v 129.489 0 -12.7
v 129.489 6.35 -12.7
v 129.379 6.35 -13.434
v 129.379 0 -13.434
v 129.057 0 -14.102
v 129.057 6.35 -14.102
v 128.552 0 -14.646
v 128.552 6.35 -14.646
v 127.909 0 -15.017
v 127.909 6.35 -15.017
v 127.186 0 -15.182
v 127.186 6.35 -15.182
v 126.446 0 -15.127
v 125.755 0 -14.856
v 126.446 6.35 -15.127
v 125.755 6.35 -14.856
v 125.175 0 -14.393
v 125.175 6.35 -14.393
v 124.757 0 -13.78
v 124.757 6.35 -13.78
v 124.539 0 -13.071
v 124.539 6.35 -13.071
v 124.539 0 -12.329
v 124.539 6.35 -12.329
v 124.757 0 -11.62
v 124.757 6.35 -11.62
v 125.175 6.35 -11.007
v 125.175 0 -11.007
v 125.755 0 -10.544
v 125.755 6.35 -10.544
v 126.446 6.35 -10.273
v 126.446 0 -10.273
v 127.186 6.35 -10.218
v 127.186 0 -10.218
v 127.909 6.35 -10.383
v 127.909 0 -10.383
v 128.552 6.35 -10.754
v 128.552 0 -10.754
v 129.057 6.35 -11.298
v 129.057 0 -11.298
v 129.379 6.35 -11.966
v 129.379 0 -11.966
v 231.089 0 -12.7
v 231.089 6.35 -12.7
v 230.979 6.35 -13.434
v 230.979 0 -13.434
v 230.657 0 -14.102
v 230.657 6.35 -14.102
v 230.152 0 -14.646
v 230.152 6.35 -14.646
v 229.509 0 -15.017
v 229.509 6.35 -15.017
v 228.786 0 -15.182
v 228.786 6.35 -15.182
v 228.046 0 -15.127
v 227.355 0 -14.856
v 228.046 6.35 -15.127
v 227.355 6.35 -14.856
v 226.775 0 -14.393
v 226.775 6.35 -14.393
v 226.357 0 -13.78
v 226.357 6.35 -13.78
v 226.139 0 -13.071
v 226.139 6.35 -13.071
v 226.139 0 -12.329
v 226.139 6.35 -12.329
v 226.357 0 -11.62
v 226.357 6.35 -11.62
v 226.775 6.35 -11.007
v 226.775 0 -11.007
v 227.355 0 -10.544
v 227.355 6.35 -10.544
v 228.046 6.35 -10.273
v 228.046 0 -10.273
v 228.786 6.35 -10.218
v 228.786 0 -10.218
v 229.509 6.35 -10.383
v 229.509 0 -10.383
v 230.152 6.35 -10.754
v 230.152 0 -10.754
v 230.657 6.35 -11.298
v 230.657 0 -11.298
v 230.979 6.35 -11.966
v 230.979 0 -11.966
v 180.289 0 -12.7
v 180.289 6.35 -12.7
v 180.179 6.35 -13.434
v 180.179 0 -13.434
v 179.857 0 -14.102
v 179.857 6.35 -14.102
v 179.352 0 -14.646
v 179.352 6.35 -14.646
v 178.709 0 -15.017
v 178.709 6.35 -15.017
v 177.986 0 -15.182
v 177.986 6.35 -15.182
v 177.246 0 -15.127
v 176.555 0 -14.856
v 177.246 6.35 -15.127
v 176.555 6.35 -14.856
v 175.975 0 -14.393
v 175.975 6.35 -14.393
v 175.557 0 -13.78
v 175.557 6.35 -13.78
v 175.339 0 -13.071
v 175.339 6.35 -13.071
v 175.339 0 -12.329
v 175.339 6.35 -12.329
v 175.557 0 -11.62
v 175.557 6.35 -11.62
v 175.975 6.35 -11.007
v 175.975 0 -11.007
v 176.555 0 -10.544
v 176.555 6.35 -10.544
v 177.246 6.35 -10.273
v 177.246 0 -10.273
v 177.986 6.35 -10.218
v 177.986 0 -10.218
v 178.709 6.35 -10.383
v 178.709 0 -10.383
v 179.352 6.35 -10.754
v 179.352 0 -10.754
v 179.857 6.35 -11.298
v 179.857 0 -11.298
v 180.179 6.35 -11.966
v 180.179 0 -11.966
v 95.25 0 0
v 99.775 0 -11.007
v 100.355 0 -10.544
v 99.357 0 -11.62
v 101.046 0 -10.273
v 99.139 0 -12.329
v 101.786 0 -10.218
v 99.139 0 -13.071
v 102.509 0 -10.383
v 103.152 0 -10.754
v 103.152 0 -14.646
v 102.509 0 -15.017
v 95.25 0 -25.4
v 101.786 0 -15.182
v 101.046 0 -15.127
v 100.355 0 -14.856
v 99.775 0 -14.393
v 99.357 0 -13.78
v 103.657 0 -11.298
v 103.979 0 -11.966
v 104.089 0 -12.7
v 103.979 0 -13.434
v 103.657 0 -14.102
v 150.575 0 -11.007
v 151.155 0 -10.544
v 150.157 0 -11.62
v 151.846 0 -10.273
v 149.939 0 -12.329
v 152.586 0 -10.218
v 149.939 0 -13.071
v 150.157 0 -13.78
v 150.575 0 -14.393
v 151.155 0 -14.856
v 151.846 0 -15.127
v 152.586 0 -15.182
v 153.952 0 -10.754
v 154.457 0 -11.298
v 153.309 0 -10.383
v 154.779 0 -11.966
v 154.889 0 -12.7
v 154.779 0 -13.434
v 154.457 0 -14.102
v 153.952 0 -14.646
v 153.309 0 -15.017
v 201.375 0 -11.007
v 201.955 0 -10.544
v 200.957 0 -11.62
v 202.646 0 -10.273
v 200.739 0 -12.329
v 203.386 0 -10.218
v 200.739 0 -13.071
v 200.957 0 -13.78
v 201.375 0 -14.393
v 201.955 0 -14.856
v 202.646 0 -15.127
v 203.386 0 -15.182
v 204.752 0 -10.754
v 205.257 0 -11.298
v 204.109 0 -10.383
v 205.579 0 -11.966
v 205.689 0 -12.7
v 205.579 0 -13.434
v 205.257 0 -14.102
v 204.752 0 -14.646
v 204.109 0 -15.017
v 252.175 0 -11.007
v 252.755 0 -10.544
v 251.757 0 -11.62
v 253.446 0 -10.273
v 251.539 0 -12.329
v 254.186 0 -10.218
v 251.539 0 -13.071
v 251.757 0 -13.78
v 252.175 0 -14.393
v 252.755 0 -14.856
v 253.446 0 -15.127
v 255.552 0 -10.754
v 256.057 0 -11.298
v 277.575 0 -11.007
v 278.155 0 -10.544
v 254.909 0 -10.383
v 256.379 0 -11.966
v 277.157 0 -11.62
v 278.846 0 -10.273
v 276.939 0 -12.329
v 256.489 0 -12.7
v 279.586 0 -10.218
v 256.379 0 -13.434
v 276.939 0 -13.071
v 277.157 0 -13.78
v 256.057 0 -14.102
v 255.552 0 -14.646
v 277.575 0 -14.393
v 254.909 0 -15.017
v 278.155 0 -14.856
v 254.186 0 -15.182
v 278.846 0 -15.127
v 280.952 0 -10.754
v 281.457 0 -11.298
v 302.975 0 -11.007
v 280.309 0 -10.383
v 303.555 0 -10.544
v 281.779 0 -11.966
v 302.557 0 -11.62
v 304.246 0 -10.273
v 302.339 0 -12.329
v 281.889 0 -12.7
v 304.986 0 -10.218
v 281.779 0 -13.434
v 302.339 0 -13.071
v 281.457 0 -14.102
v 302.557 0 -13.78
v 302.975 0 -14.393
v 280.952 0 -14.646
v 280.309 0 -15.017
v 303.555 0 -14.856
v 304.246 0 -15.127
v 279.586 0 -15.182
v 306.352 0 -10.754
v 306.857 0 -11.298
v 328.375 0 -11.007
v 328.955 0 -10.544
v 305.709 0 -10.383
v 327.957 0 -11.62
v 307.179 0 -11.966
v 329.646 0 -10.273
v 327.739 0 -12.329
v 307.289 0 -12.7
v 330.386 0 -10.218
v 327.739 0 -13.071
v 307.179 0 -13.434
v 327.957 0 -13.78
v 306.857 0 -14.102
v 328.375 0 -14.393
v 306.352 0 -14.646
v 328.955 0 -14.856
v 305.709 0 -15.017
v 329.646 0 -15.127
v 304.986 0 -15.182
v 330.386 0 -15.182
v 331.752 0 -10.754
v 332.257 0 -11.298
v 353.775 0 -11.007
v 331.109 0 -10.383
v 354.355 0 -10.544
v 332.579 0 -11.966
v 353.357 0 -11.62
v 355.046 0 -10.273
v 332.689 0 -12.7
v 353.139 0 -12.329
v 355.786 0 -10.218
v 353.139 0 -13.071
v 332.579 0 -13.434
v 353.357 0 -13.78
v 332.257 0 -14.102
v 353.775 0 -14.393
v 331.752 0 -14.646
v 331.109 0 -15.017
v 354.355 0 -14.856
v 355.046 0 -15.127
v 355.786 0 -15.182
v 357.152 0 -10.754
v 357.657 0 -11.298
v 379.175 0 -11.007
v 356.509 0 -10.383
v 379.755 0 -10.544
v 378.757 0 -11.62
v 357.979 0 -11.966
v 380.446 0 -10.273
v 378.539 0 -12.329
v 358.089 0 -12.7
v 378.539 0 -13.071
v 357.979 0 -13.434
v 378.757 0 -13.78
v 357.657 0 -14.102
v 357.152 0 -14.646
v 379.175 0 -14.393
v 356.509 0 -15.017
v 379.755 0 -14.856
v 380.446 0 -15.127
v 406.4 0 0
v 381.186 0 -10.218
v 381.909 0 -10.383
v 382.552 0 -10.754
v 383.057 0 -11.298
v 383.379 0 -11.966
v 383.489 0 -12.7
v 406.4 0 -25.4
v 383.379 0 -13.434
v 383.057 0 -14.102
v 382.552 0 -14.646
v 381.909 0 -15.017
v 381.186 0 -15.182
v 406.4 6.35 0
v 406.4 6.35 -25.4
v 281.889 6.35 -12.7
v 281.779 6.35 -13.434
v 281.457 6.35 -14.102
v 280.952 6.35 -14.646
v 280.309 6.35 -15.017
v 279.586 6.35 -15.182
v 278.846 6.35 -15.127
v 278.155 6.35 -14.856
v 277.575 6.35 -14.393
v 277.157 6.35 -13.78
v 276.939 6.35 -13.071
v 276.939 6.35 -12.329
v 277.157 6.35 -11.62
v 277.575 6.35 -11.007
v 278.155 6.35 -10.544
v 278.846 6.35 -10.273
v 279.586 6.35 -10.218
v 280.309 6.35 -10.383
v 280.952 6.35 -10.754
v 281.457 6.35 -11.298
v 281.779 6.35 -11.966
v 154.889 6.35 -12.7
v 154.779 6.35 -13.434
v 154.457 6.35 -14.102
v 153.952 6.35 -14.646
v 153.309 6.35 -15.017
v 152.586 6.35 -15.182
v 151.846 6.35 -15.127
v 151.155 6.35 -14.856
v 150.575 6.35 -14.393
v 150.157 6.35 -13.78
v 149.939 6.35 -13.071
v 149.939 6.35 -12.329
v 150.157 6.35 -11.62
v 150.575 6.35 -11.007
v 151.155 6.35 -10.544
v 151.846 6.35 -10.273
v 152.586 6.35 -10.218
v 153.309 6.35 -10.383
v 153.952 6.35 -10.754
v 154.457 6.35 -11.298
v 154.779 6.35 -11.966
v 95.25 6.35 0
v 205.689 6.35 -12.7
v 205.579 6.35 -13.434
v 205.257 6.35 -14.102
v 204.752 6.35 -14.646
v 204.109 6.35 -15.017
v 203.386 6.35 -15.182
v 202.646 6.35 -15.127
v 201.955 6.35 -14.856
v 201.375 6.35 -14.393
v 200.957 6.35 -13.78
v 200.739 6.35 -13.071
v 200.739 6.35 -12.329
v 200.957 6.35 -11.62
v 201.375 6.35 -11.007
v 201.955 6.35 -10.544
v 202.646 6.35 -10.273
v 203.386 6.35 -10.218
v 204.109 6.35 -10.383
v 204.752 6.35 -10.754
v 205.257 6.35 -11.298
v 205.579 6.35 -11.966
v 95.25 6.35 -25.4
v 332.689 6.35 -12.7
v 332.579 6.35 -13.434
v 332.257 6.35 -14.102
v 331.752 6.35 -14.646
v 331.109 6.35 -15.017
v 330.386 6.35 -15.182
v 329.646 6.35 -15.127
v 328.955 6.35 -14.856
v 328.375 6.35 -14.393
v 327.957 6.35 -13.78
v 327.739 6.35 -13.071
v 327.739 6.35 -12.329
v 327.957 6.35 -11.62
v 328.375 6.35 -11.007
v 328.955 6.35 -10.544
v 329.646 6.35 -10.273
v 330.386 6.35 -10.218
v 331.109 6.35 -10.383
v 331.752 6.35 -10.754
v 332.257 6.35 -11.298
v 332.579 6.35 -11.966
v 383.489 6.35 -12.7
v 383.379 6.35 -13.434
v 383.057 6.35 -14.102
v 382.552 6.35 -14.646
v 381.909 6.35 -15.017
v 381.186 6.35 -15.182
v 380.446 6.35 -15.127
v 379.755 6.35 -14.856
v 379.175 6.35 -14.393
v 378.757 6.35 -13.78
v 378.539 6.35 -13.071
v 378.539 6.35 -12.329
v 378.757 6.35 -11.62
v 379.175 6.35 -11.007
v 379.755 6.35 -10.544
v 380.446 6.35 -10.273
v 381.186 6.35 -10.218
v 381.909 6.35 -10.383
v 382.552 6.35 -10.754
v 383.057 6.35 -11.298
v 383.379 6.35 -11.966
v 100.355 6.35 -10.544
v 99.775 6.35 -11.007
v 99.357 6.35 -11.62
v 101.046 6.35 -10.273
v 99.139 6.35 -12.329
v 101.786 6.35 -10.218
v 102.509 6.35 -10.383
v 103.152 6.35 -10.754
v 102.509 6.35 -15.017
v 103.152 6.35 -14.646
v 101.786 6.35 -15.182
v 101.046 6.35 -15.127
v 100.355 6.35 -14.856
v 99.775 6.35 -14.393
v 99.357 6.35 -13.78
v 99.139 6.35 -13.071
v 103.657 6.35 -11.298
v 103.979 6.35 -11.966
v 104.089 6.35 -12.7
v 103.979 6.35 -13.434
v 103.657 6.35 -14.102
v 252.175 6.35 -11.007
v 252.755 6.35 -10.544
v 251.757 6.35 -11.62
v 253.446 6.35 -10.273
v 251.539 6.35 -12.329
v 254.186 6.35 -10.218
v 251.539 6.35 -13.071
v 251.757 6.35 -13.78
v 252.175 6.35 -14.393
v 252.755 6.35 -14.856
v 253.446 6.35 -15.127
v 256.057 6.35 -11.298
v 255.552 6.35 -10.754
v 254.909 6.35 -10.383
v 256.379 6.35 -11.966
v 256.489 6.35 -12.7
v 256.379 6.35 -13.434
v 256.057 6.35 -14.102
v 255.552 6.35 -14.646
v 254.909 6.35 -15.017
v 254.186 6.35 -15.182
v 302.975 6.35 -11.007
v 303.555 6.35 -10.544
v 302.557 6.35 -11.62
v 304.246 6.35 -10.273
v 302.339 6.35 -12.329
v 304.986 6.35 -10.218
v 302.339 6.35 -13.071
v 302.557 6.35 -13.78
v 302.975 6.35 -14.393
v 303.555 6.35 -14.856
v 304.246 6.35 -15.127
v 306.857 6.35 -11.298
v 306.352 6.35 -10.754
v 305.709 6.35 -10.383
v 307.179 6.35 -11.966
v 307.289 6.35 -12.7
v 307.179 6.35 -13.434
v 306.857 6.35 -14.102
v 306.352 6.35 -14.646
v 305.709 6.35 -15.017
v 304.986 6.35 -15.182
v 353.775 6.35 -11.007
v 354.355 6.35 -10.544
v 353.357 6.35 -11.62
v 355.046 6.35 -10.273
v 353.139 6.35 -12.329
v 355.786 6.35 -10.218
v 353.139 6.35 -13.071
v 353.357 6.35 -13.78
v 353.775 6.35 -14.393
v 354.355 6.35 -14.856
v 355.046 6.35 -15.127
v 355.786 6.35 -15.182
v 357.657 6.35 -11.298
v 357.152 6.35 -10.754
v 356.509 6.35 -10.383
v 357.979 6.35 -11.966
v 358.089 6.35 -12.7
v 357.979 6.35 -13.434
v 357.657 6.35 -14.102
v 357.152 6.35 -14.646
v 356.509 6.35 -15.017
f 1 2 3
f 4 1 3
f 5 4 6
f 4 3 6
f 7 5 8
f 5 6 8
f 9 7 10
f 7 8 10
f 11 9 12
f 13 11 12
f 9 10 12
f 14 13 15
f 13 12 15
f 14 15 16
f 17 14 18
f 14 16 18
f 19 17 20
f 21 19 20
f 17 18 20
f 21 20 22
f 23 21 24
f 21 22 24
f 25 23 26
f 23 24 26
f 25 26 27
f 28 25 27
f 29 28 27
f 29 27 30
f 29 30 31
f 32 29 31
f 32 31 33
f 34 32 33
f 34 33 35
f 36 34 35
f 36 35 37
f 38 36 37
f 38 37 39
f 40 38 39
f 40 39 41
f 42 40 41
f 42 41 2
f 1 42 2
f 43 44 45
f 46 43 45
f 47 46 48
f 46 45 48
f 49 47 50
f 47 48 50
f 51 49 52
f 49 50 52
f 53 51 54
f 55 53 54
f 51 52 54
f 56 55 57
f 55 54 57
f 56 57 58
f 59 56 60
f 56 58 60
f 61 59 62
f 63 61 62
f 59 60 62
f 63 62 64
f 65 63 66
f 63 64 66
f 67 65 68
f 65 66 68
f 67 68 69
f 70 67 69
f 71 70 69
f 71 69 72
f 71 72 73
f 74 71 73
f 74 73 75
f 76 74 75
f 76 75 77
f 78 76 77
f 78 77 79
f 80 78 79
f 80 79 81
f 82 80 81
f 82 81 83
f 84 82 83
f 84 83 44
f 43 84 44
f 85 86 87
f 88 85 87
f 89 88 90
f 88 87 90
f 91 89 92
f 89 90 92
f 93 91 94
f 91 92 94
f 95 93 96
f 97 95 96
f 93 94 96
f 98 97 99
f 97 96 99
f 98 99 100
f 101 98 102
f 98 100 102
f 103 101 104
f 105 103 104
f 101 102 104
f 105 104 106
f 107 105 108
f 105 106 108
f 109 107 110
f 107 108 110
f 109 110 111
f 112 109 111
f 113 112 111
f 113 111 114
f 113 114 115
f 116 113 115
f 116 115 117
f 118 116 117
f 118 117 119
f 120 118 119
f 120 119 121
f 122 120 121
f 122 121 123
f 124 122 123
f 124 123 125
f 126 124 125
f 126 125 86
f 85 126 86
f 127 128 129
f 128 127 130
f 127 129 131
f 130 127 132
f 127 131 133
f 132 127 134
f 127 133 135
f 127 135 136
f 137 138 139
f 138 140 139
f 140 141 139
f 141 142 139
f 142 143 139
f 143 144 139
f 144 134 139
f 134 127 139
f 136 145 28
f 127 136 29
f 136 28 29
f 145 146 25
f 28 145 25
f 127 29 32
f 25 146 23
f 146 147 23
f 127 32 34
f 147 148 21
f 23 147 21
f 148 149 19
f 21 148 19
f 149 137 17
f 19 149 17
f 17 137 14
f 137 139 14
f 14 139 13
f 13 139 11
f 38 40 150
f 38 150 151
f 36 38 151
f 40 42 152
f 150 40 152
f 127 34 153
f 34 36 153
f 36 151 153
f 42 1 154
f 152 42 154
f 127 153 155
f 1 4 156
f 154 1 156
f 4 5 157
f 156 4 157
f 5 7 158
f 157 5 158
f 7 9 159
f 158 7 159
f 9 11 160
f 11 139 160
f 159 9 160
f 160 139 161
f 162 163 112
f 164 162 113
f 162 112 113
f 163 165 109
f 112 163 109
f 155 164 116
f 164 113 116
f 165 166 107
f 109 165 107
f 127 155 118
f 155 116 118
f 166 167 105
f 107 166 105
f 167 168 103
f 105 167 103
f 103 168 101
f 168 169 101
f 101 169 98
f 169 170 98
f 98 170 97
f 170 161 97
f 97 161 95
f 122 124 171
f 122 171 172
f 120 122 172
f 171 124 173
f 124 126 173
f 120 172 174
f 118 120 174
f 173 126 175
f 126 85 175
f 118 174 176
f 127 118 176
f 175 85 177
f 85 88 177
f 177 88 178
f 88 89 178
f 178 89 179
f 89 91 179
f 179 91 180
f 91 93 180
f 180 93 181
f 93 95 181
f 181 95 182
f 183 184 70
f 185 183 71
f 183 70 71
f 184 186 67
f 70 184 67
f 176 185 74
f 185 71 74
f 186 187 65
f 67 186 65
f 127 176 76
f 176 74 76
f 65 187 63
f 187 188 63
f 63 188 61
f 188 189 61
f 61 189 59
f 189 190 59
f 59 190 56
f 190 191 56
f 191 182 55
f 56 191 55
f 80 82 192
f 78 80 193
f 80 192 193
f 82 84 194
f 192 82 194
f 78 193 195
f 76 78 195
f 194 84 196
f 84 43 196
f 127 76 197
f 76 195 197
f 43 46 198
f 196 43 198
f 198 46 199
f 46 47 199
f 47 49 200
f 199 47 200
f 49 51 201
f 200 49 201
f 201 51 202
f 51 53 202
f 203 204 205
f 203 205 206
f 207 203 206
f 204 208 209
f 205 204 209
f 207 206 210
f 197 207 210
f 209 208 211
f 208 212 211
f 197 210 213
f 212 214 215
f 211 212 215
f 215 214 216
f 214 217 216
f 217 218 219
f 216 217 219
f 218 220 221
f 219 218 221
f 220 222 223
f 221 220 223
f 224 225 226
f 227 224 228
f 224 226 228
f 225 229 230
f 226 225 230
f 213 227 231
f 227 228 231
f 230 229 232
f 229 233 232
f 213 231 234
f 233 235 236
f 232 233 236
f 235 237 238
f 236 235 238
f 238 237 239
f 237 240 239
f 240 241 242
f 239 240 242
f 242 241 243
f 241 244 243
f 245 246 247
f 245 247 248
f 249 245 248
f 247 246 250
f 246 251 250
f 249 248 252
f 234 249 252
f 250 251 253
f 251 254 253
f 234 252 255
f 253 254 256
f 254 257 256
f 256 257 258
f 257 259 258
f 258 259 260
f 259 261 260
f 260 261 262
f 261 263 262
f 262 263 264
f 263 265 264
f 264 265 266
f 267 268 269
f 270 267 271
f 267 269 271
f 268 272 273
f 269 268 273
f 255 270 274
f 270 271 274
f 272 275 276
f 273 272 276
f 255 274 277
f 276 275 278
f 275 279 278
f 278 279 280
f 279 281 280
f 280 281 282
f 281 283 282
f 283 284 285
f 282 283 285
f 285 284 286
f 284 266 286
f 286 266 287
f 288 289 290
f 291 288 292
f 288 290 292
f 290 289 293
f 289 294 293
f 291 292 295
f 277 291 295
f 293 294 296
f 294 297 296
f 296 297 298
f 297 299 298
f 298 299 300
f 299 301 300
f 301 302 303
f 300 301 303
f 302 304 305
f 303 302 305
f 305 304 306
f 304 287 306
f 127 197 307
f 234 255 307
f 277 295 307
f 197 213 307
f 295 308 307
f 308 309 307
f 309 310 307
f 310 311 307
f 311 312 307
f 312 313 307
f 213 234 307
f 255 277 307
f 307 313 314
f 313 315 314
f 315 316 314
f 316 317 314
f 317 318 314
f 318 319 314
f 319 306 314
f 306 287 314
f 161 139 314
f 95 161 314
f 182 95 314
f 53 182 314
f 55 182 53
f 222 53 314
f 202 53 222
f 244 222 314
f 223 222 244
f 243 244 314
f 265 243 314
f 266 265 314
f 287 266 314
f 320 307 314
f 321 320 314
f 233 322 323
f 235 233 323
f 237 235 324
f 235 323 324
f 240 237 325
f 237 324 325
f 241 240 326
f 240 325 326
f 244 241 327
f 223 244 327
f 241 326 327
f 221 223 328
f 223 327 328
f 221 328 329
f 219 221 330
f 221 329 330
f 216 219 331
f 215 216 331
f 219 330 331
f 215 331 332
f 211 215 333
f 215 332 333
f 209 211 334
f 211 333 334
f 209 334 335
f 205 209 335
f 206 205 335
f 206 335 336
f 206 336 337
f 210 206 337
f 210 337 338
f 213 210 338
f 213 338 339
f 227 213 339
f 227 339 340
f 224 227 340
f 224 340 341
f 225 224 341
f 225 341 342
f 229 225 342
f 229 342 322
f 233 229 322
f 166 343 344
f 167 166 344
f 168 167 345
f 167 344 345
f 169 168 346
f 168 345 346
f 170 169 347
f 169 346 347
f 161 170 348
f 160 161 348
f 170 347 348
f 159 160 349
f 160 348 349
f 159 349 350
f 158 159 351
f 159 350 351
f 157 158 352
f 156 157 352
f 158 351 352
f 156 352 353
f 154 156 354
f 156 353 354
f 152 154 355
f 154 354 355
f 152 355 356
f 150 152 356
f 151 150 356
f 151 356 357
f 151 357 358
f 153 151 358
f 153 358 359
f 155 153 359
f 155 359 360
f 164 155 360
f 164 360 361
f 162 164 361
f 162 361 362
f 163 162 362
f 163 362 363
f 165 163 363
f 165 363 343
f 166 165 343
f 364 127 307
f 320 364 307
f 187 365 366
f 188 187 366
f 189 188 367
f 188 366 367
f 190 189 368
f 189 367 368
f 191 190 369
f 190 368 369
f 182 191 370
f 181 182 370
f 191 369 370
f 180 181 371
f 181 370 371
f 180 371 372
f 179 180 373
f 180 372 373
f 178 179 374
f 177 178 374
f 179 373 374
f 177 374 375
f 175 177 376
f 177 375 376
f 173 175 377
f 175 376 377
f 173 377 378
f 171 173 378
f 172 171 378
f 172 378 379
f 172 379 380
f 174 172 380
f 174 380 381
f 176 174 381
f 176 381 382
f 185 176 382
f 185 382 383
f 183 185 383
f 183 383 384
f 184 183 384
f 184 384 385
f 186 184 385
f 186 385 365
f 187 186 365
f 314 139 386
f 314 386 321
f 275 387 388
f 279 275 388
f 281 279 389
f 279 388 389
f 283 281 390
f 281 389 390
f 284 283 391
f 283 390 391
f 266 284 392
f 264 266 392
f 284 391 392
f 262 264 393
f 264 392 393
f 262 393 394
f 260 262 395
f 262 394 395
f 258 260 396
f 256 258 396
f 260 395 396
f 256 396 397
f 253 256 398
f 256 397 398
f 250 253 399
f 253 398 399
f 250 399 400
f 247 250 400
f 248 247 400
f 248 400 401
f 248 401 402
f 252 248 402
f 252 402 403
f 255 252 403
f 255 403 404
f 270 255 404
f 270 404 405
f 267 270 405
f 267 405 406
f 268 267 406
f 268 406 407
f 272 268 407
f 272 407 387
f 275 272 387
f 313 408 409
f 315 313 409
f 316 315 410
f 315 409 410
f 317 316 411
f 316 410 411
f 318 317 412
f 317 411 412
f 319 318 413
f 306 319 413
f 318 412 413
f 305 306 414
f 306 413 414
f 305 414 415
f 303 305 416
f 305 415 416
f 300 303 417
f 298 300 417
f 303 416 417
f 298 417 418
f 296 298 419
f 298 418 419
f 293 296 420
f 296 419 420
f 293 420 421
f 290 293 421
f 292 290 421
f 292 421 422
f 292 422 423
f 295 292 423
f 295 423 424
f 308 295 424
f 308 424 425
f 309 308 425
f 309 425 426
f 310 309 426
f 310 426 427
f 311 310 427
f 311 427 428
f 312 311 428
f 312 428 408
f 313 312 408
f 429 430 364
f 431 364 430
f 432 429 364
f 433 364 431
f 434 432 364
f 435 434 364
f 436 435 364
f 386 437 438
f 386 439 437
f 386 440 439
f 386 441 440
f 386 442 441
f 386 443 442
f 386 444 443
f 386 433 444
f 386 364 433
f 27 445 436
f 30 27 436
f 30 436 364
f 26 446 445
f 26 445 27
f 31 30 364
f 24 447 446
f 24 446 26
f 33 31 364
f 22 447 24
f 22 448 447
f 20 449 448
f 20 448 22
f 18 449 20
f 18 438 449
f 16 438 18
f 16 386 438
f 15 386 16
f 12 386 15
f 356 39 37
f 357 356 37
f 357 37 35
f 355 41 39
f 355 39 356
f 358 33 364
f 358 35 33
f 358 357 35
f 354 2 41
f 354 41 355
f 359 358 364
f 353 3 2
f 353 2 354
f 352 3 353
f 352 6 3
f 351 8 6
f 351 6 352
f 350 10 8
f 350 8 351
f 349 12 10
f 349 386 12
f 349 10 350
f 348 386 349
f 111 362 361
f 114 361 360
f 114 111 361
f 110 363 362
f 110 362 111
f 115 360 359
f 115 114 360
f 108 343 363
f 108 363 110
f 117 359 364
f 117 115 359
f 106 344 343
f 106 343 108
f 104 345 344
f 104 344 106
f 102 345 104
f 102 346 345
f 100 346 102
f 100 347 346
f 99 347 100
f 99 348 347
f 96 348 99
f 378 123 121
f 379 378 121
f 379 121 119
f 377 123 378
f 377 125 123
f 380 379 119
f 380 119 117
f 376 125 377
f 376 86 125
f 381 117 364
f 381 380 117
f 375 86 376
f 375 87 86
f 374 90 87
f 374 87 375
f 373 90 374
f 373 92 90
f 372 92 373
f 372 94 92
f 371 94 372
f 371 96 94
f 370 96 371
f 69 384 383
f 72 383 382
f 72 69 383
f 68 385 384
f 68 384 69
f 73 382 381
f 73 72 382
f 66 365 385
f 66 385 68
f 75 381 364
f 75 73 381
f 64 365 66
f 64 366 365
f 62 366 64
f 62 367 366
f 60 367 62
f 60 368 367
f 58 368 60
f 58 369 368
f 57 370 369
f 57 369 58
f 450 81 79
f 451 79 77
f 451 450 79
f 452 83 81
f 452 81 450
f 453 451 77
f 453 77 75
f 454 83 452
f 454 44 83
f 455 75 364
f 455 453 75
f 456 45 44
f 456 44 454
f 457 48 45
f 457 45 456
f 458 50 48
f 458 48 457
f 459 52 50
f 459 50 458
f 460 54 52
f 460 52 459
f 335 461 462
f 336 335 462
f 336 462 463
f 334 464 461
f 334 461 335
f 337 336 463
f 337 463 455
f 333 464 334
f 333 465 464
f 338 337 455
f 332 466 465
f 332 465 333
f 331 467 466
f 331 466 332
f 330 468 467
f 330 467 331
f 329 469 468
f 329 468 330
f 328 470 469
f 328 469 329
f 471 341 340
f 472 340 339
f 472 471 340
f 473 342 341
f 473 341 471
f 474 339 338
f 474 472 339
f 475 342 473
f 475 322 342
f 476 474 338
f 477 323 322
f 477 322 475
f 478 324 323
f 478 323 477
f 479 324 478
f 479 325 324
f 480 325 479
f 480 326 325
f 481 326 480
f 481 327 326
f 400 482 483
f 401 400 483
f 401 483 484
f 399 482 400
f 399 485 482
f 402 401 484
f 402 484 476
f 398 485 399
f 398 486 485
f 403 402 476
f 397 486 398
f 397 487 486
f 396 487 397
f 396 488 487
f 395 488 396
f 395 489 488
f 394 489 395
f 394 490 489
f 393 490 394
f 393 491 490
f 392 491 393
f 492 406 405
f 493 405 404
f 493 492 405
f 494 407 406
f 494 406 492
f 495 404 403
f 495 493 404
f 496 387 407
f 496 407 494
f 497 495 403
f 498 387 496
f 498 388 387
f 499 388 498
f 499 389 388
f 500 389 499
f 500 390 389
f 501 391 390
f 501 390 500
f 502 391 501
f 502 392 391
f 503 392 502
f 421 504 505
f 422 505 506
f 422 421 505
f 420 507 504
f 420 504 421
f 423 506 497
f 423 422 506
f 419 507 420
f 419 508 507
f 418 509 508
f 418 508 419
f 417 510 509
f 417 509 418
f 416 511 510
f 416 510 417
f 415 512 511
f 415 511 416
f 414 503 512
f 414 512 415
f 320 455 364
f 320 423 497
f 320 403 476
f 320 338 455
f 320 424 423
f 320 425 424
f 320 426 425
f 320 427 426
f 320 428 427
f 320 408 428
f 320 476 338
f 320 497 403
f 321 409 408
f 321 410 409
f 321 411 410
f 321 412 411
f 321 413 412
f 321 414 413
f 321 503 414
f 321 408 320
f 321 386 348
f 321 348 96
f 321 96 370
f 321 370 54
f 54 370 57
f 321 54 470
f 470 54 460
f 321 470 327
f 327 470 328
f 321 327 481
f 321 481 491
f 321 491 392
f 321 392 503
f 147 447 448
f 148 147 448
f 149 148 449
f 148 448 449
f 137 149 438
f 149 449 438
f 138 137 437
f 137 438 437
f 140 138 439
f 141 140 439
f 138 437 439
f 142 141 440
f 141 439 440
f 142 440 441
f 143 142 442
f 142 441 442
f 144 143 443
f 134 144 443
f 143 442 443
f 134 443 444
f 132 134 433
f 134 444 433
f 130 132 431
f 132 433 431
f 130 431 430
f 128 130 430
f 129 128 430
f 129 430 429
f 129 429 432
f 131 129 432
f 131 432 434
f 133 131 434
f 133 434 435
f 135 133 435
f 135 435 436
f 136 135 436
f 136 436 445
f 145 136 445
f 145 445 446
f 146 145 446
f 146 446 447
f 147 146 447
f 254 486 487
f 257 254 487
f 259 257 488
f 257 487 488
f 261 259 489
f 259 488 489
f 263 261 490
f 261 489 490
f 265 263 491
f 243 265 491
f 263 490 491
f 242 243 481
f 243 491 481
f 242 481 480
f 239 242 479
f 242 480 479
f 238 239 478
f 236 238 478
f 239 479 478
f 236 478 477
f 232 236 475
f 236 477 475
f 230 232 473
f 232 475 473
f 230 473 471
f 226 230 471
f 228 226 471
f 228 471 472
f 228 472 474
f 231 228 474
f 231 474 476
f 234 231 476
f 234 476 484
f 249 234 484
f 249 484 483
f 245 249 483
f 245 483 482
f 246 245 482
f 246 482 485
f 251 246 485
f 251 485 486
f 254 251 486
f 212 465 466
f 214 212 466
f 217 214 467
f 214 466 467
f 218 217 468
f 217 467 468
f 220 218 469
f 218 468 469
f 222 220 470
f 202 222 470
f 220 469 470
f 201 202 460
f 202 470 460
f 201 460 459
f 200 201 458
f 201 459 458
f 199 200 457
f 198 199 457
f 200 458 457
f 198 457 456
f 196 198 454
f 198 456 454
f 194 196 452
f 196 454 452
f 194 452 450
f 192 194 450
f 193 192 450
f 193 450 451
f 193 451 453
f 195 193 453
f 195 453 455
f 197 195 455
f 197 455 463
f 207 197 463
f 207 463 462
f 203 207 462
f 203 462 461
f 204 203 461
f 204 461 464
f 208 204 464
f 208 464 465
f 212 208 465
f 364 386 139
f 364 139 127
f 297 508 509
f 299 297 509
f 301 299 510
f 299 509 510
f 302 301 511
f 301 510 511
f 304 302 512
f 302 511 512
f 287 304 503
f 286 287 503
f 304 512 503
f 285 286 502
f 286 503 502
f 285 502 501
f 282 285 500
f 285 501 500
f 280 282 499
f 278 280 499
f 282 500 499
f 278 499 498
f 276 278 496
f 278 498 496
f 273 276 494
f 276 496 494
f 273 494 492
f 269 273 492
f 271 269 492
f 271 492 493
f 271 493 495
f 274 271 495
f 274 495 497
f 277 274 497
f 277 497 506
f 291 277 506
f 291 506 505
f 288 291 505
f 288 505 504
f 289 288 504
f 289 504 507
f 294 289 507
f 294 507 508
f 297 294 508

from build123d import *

# Parameters (mm, degrees)
SKETCH1_W               = 406.4
SKETCH1_H               = 25.4
BOSS_EXTRUDE1_DEPTH     = 6.35
SKETCH2_R               = 2.4892
CUT_EXTRUDE1_DEPTH      = 1
CUT_EXTRUDE1_DEPTH_BACK = 7.35
SKETCH3_R               = 2.378070279
SKETCH3_R_2             = 2.20737703
CUT_EXTRUDE2_DEPTH      = 7.35
SKETCH4_W               = 25.4
SKETCH4_H               = 6.35
CUT_EXTRUDE3_DEPTH      = 95.25


with BuildPart() as part:
    # Sketch1 → Boss-Extrude1 (new body)
    with BuildSketch(Plane(origin=(0, 0, 0), x_dir=(1, 0, 0), z_dir=(0, 1, 0))):
        with Locations((203.2, 12.7)):
            Rectangle(SKETCH1_W, SKETCH1_H)
    extrude(amount=BOSS_EXTRUDE1_DEPTH)

    # Sketch2 → Cut-Extrude1 (cut, two sides)
    with BuildSketch(Plane(origin=(0, 6.35, 0), x_dir=(1, 0, 0), z_dir=(0, 1, 0))) as cut_extrude1_sk:
        with Locations((381, 12.7)):
            Circle(SKETCH2_R)
        with Locations((355.6, 12.7)):
            Circle(SKETCH2_R)
        with Locations((330.2, 12.7)):
            Circle(SKETCH2_R)
        with Locations((304.8, 12.7)):
            Circle(SKETCH2_R)
        with Locations((279.4, 12.7)):
            Circle(SKETCH2_R)
        with Locations((254, 12.7)):
            Circle(SKETCH2_R)
        with Locations((228.6, 12.7)):
            Circle(SKETCH2_R)
        with Locations((203.2, 12.7)):
            Circle(SKETCH2_R)
        with Locations((177.8, 12.7)):
            Circle(SKETCH2_R)
        with Locations((152.4, 12.7)):
            Circle(SKETCH2_R)
        with Locations((127, 12.7)):
            Circle(SKETCH2_R)
        with Locations((101.6, 12.7)):
            Circle(SKETCH2_R)
    extrude(amount=CUT_EXTRUDE1_DEPTH, mode=Mode.SUBTRACT)
    extrude(cut_extrude1_sk.sketch, amount=-CUT_EXTRUDE1_DEPTH_BACK, mode=Mode.SUBTRACT)

    # Sketch3 → Cut-Extrude2 (cut, through all)
    with BuildSketch(Plane.XZ):
        with Locations((63.5, -12.7)):
            Circle(SKETCH3_R)
        with Locations((38.1, -12.7)):
            Circle(SKETCH3_R_2)
    extrude(amount=-CUT_EXTRUDE2_DEPTH, mode=Mode.SUBTRACT)

    # Sketch4 → Cut-Extrude3 (cut)
    with BuildSketch(Plane.ZY):
        with Locations((-12.7, 3.175)):
            Rectangle(SKETCH4_W, SKETCH4_H)
    extrude(amount=-CUT_EXTRUDE3_DEPTH, mode=Mode.SUBTRACT)


solid = part.part
